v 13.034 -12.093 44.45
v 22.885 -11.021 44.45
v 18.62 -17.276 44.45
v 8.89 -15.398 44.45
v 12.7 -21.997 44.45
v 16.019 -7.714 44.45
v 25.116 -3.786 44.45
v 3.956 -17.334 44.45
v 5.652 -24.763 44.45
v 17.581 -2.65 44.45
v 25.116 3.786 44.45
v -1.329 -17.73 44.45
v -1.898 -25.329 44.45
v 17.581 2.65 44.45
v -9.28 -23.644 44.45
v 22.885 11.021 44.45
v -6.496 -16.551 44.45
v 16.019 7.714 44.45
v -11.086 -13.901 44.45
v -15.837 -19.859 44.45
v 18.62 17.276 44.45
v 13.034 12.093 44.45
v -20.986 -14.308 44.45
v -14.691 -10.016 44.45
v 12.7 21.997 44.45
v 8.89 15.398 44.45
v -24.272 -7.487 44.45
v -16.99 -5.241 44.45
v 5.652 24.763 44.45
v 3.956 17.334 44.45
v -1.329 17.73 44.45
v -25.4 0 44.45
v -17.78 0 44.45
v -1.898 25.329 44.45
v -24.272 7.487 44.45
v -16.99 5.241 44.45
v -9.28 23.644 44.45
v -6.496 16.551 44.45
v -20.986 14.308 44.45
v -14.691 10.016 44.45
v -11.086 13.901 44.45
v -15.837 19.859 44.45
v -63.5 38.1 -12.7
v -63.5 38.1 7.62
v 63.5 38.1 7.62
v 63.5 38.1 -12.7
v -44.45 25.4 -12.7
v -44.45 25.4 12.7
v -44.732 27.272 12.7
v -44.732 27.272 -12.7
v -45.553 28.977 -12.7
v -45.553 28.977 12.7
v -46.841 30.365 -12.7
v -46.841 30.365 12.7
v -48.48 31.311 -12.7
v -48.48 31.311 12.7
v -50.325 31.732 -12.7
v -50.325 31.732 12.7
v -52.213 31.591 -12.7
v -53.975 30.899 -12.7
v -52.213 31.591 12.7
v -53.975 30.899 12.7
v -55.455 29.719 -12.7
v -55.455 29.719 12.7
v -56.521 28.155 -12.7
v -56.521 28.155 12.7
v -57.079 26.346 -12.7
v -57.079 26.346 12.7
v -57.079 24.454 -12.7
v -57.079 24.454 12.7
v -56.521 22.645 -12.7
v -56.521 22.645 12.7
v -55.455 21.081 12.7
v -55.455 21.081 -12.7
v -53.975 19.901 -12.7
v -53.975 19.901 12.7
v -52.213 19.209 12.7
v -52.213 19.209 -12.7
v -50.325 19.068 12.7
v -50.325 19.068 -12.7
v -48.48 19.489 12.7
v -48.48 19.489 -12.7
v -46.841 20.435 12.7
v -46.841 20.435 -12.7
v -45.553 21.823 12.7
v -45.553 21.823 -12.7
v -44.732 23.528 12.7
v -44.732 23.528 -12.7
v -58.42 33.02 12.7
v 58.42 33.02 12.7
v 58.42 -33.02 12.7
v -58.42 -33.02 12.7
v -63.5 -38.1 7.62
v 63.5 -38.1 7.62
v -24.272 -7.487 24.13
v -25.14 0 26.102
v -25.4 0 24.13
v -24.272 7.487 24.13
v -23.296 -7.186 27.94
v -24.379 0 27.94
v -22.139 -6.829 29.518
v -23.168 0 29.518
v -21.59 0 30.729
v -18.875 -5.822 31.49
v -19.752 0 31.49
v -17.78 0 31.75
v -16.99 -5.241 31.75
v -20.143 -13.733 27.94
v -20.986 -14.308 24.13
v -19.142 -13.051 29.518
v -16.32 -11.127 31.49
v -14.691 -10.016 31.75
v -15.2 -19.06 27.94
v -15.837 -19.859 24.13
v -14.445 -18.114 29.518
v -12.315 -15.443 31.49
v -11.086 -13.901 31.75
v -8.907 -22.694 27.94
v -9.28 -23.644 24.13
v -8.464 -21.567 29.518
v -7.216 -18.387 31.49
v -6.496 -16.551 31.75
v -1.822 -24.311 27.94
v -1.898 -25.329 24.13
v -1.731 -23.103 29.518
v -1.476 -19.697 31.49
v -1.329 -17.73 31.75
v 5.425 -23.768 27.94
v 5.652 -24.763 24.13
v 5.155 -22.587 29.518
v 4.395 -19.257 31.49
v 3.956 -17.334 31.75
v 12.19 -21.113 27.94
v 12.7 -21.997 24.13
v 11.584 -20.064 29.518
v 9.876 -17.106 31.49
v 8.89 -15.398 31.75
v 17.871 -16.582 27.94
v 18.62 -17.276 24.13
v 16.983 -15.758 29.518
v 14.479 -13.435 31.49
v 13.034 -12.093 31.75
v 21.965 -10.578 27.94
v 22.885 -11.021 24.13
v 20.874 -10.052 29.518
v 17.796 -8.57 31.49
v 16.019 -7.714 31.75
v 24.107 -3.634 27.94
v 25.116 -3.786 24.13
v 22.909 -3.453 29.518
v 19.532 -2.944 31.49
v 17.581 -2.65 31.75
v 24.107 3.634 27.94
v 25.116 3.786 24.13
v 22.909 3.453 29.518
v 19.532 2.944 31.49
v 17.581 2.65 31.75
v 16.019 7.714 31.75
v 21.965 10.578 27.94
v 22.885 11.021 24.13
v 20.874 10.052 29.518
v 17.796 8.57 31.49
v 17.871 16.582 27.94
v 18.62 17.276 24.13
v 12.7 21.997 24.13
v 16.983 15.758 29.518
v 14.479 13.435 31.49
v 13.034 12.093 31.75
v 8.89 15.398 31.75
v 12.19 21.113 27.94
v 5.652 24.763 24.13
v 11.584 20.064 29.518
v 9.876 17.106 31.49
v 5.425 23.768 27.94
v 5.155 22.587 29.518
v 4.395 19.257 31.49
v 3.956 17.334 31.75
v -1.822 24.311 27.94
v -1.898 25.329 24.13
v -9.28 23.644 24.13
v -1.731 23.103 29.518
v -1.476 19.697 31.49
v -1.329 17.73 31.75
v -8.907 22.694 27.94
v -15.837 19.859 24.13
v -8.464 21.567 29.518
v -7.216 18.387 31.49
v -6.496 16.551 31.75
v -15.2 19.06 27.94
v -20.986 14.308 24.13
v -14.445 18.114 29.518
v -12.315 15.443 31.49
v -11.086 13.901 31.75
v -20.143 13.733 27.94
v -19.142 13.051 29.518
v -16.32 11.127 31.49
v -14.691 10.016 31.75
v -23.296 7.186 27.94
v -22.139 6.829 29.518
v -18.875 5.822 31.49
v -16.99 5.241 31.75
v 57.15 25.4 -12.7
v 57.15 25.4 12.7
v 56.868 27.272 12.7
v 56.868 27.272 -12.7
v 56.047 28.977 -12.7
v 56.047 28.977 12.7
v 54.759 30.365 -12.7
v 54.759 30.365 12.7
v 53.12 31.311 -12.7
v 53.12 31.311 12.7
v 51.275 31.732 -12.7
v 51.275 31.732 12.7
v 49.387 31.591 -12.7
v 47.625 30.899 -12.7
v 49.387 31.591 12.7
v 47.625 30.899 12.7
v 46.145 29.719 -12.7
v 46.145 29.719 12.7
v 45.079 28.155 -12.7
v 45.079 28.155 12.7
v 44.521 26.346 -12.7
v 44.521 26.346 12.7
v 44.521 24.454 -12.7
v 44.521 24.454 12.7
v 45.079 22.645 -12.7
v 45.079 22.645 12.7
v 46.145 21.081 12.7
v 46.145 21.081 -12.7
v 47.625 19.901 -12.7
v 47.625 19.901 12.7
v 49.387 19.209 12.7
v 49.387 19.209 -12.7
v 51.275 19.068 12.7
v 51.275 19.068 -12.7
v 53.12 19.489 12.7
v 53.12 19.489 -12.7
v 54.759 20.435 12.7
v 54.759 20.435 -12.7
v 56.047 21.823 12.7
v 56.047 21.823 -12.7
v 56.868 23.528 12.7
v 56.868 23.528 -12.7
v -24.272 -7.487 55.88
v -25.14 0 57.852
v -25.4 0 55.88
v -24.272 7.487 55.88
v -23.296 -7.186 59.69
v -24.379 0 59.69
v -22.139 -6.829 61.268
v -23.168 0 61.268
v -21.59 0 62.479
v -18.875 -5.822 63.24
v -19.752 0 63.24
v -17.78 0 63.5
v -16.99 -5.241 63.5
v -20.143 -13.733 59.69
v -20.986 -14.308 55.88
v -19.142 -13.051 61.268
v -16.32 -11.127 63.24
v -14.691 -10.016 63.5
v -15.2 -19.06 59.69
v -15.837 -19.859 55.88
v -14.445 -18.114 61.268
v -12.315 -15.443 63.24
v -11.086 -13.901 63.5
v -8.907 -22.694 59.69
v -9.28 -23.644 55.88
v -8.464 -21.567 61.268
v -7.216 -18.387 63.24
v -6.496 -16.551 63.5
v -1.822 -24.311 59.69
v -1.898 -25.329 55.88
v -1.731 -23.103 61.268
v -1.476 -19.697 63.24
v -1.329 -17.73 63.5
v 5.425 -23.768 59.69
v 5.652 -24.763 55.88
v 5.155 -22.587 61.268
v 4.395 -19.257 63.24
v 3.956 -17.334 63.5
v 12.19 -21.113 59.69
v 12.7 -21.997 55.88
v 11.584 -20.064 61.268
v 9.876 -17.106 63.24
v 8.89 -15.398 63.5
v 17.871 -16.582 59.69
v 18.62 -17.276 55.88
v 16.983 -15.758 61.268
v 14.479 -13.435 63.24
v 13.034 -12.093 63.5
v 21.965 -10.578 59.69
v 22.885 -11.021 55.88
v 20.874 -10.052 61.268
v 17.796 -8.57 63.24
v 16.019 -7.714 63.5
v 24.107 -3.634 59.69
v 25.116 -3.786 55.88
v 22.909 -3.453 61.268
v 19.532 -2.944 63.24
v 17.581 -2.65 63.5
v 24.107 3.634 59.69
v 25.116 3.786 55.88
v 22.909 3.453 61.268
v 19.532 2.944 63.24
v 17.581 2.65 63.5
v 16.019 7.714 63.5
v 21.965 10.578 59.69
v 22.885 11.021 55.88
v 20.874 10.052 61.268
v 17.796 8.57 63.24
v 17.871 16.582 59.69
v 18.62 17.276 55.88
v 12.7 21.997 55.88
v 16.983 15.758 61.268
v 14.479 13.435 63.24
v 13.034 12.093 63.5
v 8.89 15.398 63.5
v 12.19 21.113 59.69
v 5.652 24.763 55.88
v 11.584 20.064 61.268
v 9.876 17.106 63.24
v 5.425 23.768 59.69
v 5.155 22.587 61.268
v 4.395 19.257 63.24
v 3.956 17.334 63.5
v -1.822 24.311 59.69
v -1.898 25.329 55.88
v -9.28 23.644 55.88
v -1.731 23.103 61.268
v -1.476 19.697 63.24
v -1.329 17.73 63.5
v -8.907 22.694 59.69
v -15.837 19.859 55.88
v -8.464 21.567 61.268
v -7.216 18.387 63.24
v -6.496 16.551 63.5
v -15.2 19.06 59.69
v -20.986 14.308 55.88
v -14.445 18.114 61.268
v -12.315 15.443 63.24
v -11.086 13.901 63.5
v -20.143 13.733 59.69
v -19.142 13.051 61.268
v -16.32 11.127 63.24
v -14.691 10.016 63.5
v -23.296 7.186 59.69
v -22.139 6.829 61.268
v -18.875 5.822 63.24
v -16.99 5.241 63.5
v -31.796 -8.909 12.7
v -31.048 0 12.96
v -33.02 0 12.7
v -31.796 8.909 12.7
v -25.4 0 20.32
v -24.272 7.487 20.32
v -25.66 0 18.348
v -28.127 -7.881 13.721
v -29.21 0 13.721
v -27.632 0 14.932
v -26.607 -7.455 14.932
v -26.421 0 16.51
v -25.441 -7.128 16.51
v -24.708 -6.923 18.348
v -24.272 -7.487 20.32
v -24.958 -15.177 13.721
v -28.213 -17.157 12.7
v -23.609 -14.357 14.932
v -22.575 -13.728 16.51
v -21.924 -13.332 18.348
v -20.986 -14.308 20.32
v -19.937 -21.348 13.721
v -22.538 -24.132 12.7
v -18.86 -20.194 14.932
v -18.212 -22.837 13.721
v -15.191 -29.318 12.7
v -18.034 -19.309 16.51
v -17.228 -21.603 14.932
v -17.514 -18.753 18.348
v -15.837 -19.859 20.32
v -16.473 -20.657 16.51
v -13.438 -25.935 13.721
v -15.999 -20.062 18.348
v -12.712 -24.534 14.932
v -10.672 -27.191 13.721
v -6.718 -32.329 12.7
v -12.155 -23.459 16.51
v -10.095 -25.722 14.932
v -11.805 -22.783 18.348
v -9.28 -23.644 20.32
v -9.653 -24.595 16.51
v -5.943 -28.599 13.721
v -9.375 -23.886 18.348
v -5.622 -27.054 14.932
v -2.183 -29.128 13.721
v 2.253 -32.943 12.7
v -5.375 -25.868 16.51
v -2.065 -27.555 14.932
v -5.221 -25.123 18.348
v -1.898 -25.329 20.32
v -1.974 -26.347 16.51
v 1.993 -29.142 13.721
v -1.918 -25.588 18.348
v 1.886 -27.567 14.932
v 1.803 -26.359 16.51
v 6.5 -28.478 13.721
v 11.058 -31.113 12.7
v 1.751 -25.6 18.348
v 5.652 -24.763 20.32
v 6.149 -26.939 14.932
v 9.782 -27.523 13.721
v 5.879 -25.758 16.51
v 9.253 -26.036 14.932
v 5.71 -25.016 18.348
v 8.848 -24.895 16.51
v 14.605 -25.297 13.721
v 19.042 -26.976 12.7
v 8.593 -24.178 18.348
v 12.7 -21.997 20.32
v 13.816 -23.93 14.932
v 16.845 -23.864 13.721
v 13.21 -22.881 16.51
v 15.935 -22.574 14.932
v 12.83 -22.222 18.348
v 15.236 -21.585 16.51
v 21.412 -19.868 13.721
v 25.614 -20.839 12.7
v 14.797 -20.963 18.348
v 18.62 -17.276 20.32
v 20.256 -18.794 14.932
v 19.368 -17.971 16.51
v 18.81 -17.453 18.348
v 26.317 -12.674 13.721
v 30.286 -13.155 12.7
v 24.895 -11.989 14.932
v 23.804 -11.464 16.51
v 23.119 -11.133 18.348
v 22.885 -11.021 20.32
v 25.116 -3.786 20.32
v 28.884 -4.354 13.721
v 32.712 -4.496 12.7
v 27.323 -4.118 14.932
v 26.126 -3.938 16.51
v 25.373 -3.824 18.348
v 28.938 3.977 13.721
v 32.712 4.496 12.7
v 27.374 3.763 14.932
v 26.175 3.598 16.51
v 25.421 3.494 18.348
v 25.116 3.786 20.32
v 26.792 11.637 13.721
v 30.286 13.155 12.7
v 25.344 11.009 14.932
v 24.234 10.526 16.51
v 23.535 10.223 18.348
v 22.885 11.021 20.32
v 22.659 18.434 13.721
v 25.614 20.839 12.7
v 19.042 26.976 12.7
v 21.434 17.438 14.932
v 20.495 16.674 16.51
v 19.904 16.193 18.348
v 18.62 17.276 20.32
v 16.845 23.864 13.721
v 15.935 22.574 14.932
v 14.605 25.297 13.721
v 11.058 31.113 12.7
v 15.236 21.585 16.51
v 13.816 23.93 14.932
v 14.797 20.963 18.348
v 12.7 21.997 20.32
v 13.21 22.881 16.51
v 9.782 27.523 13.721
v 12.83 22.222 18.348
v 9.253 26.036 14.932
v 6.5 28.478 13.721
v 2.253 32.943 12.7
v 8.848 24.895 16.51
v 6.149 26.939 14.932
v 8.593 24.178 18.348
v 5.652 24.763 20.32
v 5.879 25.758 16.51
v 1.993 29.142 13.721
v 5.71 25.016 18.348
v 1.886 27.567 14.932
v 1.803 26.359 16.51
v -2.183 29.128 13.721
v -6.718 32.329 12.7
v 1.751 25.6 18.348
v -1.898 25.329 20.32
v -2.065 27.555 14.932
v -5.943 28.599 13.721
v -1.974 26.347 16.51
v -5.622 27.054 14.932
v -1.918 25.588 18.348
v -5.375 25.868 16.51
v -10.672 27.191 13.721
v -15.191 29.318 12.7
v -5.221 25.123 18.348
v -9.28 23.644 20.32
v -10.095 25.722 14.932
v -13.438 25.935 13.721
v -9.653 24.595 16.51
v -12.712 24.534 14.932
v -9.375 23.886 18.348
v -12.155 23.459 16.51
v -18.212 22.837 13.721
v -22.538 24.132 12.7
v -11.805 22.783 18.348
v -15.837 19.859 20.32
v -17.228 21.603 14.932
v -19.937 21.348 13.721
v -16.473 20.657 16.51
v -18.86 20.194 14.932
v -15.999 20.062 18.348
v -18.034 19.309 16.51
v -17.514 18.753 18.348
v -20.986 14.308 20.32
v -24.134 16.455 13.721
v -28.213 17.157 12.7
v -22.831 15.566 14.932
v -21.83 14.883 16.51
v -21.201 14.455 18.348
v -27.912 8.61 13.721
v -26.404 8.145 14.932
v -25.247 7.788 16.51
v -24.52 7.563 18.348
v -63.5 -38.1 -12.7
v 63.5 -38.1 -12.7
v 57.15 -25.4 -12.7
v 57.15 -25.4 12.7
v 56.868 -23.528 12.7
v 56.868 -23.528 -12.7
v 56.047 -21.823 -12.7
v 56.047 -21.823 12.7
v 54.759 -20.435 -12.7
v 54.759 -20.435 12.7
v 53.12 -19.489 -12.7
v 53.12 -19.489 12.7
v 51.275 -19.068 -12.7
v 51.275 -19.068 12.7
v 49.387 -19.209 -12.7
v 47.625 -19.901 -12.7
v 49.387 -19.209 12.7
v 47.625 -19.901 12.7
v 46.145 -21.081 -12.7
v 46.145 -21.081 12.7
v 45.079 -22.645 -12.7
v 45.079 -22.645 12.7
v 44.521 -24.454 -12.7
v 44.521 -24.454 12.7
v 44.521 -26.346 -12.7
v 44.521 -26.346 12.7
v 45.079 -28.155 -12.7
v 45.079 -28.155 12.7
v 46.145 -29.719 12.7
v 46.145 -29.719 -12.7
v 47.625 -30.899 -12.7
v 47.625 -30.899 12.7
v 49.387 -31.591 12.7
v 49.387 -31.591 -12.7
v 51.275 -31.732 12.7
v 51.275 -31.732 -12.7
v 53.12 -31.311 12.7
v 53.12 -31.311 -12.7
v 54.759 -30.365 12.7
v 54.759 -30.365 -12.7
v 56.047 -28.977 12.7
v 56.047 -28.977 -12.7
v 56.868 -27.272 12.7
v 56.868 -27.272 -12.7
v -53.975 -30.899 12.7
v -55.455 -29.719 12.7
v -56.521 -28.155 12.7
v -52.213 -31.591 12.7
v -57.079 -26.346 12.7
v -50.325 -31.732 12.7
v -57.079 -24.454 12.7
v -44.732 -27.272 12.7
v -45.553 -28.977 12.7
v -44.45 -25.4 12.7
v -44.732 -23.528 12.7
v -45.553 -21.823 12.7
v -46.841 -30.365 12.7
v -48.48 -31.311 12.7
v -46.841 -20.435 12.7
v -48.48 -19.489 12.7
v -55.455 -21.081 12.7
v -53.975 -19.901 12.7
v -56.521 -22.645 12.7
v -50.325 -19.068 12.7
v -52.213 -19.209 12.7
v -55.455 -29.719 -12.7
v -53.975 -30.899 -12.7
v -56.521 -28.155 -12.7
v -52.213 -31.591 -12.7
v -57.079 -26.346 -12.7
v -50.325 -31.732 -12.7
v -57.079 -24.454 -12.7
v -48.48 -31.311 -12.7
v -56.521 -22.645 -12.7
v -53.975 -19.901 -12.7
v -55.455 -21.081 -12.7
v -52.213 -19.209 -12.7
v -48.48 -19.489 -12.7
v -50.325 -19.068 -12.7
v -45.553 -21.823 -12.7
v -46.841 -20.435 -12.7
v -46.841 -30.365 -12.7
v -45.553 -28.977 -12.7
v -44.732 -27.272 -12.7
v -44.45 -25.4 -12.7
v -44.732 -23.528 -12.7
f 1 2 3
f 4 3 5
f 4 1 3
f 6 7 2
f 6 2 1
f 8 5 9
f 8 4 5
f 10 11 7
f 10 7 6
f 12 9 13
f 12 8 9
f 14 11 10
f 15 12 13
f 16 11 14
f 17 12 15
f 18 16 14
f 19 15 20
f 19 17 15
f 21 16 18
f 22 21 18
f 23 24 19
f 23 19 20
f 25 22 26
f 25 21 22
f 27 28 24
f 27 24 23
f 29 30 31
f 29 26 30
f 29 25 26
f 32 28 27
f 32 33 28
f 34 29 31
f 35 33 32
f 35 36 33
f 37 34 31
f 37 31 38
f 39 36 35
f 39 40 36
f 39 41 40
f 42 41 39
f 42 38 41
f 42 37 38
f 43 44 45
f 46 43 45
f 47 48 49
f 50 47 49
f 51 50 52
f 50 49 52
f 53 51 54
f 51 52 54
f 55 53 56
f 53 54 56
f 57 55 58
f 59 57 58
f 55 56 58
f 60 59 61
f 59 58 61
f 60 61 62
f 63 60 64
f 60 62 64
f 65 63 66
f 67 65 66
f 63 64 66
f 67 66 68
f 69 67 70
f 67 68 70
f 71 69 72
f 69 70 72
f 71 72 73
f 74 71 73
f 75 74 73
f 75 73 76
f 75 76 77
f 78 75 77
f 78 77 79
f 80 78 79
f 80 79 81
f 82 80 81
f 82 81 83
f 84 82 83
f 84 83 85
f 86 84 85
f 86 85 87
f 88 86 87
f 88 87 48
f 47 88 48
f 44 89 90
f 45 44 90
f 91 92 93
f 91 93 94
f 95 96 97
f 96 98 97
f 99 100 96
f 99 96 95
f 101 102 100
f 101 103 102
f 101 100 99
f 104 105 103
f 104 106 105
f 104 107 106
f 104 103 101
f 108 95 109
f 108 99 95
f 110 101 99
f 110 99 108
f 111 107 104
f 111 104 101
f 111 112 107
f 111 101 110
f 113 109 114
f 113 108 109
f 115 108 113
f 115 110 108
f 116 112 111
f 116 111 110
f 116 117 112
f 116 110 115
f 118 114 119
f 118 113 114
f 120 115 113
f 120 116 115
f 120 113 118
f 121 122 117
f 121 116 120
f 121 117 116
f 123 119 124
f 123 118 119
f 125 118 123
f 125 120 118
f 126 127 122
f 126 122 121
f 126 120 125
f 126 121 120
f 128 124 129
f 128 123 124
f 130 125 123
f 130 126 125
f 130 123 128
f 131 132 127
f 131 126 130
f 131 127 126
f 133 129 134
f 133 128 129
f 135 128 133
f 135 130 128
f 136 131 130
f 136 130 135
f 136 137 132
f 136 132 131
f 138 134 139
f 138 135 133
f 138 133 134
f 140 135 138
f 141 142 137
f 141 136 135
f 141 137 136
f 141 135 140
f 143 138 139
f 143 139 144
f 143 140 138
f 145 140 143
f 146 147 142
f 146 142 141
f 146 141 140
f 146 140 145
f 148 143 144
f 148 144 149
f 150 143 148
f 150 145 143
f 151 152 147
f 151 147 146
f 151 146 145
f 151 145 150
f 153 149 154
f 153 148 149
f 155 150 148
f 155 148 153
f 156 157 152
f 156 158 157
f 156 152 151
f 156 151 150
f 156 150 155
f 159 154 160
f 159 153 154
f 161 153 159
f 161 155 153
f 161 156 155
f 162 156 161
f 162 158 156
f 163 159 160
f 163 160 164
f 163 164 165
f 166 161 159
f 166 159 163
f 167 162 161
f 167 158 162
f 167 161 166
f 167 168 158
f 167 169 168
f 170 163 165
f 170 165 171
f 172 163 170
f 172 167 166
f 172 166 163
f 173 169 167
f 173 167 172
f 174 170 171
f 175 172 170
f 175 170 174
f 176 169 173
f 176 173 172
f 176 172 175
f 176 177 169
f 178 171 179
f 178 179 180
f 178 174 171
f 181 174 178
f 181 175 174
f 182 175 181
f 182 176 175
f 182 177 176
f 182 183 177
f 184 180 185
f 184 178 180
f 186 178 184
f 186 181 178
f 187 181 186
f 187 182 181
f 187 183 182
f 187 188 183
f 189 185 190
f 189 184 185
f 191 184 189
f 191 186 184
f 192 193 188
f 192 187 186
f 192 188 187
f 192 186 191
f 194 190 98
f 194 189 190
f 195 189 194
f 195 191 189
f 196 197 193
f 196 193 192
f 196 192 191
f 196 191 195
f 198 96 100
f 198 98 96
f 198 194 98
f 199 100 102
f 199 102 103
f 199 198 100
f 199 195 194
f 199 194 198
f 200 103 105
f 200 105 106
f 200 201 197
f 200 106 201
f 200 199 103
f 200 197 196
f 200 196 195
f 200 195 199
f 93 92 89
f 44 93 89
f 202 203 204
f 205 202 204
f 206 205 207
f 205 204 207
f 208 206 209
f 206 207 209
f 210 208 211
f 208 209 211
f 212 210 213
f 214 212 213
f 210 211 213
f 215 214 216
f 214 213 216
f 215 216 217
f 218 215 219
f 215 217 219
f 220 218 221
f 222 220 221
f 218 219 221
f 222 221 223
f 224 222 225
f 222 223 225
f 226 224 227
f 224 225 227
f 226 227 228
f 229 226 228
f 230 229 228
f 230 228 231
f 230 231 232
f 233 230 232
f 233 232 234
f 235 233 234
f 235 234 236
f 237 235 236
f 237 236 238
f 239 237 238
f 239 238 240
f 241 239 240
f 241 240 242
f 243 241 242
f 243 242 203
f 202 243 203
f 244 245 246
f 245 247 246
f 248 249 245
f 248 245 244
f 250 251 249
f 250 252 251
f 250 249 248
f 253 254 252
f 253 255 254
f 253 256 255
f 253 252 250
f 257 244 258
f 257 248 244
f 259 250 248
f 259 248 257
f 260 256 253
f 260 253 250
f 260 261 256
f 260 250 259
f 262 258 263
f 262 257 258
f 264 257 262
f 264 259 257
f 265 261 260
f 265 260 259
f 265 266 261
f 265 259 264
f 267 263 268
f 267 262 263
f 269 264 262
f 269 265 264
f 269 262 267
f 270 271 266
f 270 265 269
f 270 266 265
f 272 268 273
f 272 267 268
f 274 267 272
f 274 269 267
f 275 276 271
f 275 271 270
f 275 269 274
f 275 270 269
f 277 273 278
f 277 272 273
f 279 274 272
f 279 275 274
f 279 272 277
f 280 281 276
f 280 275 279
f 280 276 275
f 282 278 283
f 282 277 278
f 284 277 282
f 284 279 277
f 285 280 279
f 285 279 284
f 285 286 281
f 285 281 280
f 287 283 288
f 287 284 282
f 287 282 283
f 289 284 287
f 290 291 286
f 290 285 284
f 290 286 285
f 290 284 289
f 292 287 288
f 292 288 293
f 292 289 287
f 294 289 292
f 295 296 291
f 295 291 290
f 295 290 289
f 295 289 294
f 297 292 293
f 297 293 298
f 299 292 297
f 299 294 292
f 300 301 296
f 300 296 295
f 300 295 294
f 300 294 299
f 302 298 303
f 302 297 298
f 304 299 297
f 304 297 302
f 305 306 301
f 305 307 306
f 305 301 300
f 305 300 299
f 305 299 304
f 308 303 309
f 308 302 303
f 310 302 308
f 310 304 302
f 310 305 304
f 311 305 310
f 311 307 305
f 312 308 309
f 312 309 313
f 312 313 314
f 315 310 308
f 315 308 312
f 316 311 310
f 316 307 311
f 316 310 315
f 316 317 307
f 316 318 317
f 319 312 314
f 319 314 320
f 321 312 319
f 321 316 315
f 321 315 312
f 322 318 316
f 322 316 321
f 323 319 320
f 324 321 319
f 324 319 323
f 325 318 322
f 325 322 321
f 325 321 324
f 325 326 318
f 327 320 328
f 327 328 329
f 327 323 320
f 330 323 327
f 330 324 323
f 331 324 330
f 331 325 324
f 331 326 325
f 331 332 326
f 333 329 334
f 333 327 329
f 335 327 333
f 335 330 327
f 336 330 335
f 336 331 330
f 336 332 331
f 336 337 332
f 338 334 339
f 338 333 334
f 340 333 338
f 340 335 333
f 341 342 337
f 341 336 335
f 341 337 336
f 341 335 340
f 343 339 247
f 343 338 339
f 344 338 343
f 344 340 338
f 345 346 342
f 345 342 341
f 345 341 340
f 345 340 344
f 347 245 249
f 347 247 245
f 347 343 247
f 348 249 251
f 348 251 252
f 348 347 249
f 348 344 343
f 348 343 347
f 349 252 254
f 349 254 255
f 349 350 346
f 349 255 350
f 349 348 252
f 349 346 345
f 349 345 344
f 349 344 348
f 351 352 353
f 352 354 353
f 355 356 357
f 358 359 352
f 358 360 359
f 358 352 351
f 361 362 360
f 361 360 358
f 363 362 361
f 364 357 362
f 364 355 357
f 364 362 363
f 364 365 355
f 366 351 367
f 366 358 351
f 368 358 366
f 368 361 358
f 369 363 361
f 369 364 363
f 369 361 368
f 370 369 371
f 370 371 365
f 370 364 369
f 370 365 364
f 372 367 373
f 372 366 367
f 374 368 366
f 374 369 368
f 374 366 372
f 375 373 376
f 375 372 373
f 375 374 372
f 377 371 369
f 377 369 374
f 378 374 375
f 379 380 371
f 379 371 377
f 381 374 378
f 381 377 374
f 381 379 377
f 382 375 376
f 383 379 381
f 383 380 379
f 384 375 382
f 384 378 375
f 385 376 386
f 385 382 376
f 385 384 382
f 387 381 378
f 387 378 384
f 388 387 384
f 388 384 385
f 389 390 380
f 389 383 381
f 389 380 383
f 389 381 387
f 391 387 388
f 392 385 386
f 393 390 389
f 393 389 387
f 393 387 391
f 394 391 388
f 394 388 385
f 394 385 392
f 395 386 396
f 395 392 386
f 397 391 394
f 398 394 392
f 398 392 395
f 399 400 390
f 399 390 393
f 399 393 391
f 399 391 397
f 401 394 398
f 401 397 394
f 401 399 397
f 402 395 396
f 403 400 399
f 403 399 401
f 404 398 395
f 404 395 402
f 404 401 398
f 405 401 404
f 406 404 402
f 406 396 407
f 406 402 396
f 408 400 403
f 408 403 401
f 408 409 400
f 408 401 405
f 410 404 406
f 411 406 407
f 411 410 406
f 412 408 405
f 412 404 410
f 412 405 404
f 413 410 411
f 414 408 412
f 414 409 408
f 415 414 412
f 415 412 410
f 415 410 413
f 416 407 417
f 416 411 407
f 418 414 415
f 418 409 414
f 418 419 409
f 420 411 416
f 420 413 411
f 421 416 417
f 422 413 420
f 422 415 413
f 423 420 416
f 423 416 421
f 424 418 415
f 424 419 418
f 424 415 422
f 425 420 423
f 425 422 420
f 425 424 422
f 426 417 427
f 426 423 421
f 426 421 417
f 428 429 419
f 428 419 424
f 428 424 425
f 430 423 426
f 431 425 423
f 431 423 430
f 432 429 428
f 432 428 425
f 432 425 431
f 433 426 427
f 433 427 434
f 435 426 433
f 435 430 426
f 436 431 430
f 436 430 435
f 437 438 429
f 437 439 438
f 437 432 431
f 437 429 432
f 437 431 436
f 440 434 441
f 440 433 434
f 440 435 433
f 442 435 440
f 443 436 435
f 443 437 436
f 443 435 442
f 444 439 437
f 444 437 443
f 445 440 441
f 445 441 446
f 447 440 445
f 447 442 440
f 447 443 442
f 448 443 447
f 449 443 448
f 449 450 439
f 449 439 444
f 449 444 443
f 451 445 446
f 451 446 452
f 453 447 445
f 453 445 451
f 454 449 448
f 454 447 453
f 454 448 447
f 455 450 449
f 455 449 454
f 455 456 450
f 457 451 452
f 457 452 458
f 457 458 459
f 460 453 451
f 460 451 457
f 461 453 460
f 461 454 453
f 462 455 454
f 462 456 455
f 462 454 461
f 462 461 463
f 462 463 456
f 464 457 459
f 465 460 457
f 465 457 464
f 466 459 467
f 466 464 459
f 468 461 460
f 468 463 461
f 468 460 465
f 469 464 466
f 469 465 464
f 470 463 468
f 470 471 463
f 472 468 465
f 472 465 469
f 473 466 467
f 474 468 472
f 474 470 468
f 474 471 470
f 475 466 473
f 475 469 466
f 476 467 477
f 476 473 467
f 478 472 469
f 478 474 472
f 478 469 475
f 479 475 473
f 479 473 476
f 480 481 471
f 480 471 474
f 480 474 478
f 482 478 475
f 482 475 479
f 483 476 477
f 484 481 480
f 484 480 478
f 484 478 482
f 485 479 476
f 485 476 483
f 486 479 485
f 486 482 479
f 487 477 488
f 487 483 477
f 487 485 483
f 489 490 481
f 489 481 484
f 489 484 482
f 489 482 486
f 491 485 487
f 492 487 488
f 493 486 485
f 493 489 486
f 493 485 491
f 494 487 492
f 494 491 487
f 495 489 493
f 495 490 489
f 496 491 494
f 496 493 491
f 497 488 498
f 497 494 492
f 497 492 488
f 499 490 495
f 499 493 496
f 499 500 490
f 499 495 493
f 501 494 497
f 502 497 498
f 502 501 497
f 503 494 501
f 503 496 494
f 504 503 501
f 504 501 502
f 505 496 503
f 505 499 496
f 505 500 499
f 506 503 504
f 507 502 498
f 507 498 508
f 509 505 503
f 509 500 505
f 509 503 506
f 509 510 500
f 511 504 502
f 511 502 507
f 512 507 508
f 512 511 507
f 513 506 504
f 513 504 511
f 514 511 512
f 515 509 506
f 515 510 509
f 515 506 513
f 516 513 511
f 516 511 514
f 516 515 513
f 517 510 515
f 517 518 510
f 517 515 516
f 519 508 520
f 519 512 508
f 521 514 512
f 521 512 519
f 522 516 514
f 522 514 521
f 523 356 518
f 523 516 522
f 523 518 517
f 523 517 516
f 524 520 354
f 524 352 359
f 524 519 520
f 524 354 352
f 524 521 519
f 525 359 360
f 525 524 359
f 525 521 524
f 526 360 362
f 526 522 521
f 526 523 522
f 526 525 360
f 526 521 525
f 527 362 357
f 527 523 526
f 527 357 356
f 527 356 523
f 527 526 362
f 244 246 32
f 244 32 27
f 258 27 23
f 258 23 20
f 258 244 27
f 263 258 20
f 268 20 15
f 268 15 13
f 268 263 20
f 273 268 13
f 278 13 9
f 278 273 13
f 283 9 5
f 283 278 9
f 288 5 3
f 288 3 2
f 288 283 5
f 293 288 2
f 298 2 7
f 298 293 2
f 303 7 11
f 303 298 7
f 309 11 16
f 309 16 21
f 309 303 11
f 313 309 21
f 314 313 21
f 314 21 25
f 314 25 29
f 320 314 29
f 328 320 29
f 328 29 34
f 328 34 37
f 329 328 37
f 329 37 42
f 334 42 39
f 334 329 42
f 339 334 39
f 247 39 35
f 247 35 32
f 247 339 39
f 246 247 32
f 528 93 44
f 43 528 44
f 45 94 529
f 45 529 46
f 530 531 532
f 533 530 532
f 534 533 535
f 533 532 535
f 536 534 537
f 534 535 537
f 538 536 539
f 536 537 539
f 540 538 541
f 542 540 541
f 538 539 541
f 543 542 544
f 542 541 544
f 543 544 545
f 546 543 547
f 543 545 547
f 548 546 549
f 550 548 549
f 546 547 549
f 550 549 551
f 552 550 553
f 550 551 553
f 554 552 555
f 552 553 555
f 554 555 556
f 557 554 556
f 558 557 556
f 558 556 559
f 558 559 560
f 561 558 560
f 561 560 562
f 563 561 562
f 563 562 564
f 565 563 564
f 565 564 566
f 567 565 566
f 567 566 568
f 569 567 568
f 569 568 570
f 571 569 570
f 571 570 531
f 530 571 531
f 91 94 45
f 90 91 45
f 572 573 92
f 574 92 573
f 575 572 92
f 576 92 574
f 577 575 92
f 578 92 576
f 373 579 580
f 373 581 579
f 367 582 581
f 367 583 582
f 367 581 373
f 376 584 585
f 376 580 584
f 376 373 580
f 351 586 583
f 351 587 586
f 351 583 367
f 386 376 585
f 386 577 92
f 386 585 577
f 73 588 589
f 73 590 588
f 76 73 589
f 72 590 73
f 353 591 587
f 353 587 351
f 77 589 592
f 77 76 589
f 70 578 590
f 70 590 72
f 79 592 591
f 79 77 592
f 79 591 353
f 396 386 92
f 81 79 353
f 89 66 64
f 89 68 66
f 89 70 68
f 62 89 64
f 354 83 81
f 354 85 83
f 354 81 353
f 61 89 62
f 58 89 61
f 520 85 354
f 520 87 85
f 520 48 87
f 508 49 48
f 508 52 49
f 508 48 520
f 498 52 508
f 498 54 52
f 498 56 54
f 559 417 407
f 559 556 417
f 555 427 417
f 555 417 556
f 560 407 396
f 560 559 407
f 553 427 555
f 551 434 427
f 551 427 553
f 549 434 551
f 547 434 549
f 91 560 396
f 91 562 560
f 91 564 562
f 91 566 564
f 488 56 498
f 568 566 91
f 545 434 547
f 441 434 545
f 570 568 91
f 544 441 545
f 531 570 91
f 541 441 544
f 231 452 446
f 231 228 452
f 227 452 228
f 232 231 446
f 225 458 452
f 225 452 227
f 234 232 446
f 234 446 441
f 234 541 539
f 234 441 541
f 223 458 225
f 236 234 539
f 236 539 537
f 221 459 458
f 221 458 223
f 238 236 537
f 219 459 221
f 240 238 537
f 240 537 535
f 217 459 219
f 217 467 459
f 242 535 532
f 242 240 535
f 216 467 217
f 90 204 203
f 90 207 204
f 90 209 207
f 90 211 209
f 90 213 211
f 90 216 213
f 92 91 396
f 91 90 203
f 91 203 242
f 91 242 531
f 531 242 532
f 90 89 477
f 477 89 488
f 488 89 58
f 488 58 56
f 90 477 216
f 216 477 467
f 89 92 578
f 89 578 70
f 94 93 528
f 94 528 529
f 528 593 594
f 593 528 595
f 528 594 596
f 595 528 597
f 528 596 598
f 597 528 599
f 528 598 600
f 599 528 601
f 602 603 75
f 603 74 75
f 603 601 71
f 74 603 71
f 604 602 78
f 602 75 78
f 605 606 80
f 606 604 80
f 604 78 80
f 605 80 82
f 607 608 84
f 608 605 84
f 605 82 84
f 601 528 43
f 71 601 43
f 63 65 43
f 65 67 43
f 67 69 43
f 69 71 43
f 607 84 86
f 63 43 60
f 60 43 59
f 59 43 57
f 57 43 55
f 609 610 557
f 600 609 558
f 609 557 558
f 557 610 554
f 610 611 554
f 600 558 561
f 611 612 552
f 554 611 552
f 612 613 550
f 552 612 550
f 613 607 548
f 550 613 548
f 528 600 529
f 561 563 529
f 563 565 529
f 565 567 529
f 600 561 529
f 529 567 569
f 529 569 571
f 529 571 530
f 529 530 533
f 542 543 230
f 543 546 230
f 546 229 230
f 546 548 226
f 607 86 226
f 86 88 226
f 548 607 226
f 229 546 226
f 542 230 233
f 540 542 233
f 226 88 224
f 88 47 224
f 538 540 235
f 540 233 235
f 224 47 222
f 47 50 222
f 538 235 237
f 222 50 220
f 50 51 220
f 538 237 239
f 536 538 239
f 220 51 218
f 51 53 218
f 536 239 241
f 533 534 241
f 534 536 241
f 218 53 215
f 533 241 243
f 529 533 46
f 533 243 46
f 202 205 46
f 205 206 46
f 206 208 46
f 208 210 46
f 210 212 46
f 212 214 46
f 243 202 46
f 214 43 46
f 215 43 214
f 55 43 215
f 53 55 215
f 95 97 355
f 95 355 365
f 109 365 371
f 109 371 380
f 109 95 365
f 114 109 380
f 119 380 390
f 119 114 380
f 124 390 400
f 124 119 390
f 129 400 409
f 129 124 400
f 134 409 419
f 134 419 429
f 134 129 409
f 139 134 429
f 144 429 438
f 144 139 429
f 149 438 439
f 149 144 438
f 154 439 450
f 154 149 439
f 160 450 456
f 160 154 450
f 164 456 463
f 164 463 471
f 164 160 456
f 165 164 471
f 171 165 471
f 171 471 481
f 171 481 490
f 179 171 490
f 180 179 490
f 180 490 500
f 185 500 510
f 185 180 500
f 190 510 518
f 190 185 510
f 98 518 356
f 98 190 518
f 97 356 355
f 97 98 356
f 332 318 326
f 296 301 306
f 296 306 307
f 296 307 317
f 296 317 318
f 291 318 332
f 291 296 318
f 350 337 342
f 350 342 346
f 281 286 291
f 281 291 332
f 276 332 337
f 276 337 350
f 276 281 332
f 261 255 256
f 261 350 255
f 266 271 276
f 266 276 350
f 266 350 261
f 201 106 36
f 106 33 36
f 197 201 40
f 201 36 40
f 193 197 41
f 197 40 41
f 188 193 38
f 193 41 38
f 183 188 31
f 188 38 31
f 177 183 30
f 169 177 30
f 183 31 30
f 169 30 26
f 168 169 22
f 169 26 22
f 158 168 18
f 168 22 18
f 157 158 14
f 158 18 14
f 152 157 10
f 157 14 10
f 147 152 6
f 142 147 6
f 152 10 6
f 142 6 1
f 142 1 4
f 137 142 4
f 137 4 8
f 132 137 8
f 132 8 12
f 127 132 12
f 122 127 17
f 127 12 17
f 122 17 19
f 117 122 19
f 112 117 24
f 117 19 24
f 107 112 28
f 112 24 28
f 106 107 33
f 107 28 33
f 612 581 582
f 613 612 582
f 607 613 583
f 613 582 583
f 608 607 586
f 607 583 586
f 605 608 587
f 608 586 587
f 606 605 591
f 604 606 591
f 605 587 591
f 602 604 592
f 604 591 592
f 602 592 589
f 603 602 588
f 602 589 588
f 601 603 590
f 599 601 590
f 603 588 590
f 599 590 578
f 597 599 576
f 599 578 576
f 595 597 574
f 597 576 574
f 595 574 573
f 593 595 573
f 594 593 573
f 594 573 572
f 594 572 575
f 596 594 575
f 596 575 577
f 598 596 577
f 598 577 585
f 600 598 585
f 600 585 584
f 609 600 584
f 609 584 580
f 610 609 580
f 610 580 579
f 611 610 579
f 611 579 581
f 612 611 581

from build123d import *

# Parameters (mm, degrees)
F0_W     = 127
F0_H     = 76.2
F1_DEPTH = 12.7
F2_R     = 6.35
F3_DEPTH = 38.1
F4_W     = 25.4
F4_H     = 50.8
F6_W     = 16.0364900438
F6_H     = 12.7
F8_SIZE  = 5.08
F9_R     = 7.61999


# Not quite as in the source:
# - a fillet or chamfer is up to 0.001 mm smaller than in the source, because OpenCascade refuses the exact size


with BuildPart() as f1:
    # F0 (on Top) → F1 (new body, symmetric)
    with BuildSketch(Plane.XY):
        Rectangle(F0_W, F0_H)
    extrude(amount=F1_DEPTH, both=True)

    # F2 (on face) → F3 (cut)
    with BuildSketch(Plane.XY.offset(12.7)):
        with Locations((-50.8, 25.4)):
            Circle(F2_R)
        with Locations((50.8, 25.4)):
            Circle(F2_R)
        with Locations((50.8, -25.4)):
            Circle(F2_R)
        with Locations((-50.8, -25.4)):
            Circle(F2_R)
    extrude(amount=-F3_DEPTH, mode=Mode.SUBTRACT)

    # F4 (on Front) → F5 (revolve)
    with BuildSketch(Plane.XZ):
        with Locations((-12.7, 38.1)):
            Rectangle(F4_W, F4_H)
    revolve(axis=Axis((0, 0, 38.1), (0, 0, 1)))

    # F6 (on Front) → F7 (revolve, cut)
    with BuildSketch(Plane.XZ):
        with Locations((-25.7982450219, 38.1)):
            Rectangle(F6_W, F6_H)
    revolve(axis=Axis((0, 0, 63.5), (0, 0, -1)), mode=Mode.SUBTRACT)

    # F8
    f8_edges = [f1.edges().sort_by_distance(p)[0] for p in [
        (0, -38.1, 12.7),
        (-63.5, 0, 12.7),
        (0, 38.1, 12.7),
        (63.5, 0, 12.7),
    ]]
    chamfer(f8_edges, length=F8_SIZE)

    # F9 (radius 7.62 in the source; OpenCascade refuses exactly that, so slightly less here)
    f9_edges = [f1.edges().sort_by_distance(p)[0] for p in [
        (25.4, 0, 12.7),
        (25.4, 0, 31.75),
        (25.4, 0, 63.5),
    ]]
    fillet(f9_edges, radius=F9_R)


solid = f1.part
